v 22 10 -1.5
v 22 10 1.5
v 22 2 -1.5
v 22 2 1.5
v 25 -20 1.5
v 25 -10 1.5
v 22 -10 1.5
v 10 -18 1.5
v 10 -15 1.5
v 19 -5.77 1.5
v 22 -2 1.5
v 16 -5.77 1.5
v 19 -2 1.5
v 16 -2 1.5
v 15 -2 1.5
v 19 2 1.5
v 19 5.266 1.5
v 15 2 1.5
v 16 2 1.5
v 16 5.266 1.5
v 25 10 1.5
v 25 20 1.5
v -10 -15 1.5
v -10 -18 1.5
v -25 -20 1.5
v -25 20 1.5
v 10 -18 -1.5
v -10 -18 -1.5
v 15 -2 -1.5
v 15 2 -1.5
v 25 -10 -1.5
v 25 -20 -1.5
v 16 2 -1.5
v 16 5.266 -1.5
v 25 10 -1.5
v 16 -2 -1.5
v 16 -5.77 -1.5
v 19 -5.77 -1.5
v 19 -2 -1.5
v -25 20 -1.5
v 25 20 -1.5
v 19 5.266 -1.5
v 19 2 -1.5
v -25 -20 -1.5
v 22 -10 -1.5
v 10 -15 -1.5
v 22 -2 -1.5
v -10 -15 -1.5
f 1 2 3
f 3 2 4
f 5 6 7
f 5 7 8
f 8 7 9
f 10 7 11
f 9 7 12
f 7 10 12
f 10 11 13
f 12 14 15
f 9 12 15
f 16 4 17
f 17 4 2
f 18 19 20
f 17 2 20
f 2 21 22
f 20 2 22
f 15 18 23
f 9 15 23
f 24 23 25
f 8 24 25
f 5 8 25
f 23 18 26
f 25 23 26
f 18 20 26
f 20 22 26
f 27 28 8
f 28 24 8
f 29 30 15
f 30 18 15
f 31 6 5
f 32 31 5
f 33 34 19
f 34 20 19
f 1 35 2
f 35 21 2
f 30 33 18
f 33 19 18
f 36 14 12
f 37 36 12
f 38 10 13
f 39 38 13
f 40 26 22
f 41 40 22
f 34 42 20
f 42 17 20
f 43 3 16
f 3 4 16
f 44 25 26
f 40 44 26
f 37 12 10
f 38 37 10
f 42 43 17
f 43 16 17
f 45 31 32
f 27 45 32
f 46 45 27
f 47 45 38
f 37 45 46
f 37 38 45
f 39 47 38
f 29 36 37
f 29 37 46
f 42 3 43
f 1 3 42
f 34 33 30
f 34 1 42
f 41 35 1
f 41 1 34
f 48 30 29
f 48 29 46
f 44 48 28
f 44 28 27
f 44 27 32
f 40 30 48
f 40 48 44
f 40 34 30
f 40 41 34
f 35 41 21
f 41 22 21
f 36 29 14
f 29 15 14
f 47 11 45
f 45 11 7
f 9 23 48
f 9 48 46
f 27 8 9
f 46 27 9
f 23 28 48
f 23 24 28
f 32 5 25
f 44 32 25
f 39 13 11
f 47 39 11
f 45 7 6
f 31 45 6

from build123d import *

# Parameters (mm, degrees)
SKETCH_1_W      = 20
SKETCH_1_H      = 3
EXTRUDE_1_DEPTH = 1.5


with BuildPart() as part:
    # 草图1 → 凸台-拉伸1 (new body, symmetric)
    with BuildSketch(Plane.XY):
        Polygon((-25, 20), (25, 20), (25, 10), (22, 10), (22, 2), (19, 2), (19, 5.265909841), (16, 5.265909841), (16, 2), (15, 2), (15, -2), (16, -2), (16, -5.769694942), (19, -5.769694942), (19, -2), (22, -2), (22, -10), (25, -10), (25, -20), (-25, -20), align=None)
        with Locations((0, -16.5)):
            Rectangle(SKETCH_1_W, SKETCH_1_H, mode=Mode.SUBTRACT)
    extrude(amount=EXTRUDE_1_DEPTH, both=True)


solid = part.part
